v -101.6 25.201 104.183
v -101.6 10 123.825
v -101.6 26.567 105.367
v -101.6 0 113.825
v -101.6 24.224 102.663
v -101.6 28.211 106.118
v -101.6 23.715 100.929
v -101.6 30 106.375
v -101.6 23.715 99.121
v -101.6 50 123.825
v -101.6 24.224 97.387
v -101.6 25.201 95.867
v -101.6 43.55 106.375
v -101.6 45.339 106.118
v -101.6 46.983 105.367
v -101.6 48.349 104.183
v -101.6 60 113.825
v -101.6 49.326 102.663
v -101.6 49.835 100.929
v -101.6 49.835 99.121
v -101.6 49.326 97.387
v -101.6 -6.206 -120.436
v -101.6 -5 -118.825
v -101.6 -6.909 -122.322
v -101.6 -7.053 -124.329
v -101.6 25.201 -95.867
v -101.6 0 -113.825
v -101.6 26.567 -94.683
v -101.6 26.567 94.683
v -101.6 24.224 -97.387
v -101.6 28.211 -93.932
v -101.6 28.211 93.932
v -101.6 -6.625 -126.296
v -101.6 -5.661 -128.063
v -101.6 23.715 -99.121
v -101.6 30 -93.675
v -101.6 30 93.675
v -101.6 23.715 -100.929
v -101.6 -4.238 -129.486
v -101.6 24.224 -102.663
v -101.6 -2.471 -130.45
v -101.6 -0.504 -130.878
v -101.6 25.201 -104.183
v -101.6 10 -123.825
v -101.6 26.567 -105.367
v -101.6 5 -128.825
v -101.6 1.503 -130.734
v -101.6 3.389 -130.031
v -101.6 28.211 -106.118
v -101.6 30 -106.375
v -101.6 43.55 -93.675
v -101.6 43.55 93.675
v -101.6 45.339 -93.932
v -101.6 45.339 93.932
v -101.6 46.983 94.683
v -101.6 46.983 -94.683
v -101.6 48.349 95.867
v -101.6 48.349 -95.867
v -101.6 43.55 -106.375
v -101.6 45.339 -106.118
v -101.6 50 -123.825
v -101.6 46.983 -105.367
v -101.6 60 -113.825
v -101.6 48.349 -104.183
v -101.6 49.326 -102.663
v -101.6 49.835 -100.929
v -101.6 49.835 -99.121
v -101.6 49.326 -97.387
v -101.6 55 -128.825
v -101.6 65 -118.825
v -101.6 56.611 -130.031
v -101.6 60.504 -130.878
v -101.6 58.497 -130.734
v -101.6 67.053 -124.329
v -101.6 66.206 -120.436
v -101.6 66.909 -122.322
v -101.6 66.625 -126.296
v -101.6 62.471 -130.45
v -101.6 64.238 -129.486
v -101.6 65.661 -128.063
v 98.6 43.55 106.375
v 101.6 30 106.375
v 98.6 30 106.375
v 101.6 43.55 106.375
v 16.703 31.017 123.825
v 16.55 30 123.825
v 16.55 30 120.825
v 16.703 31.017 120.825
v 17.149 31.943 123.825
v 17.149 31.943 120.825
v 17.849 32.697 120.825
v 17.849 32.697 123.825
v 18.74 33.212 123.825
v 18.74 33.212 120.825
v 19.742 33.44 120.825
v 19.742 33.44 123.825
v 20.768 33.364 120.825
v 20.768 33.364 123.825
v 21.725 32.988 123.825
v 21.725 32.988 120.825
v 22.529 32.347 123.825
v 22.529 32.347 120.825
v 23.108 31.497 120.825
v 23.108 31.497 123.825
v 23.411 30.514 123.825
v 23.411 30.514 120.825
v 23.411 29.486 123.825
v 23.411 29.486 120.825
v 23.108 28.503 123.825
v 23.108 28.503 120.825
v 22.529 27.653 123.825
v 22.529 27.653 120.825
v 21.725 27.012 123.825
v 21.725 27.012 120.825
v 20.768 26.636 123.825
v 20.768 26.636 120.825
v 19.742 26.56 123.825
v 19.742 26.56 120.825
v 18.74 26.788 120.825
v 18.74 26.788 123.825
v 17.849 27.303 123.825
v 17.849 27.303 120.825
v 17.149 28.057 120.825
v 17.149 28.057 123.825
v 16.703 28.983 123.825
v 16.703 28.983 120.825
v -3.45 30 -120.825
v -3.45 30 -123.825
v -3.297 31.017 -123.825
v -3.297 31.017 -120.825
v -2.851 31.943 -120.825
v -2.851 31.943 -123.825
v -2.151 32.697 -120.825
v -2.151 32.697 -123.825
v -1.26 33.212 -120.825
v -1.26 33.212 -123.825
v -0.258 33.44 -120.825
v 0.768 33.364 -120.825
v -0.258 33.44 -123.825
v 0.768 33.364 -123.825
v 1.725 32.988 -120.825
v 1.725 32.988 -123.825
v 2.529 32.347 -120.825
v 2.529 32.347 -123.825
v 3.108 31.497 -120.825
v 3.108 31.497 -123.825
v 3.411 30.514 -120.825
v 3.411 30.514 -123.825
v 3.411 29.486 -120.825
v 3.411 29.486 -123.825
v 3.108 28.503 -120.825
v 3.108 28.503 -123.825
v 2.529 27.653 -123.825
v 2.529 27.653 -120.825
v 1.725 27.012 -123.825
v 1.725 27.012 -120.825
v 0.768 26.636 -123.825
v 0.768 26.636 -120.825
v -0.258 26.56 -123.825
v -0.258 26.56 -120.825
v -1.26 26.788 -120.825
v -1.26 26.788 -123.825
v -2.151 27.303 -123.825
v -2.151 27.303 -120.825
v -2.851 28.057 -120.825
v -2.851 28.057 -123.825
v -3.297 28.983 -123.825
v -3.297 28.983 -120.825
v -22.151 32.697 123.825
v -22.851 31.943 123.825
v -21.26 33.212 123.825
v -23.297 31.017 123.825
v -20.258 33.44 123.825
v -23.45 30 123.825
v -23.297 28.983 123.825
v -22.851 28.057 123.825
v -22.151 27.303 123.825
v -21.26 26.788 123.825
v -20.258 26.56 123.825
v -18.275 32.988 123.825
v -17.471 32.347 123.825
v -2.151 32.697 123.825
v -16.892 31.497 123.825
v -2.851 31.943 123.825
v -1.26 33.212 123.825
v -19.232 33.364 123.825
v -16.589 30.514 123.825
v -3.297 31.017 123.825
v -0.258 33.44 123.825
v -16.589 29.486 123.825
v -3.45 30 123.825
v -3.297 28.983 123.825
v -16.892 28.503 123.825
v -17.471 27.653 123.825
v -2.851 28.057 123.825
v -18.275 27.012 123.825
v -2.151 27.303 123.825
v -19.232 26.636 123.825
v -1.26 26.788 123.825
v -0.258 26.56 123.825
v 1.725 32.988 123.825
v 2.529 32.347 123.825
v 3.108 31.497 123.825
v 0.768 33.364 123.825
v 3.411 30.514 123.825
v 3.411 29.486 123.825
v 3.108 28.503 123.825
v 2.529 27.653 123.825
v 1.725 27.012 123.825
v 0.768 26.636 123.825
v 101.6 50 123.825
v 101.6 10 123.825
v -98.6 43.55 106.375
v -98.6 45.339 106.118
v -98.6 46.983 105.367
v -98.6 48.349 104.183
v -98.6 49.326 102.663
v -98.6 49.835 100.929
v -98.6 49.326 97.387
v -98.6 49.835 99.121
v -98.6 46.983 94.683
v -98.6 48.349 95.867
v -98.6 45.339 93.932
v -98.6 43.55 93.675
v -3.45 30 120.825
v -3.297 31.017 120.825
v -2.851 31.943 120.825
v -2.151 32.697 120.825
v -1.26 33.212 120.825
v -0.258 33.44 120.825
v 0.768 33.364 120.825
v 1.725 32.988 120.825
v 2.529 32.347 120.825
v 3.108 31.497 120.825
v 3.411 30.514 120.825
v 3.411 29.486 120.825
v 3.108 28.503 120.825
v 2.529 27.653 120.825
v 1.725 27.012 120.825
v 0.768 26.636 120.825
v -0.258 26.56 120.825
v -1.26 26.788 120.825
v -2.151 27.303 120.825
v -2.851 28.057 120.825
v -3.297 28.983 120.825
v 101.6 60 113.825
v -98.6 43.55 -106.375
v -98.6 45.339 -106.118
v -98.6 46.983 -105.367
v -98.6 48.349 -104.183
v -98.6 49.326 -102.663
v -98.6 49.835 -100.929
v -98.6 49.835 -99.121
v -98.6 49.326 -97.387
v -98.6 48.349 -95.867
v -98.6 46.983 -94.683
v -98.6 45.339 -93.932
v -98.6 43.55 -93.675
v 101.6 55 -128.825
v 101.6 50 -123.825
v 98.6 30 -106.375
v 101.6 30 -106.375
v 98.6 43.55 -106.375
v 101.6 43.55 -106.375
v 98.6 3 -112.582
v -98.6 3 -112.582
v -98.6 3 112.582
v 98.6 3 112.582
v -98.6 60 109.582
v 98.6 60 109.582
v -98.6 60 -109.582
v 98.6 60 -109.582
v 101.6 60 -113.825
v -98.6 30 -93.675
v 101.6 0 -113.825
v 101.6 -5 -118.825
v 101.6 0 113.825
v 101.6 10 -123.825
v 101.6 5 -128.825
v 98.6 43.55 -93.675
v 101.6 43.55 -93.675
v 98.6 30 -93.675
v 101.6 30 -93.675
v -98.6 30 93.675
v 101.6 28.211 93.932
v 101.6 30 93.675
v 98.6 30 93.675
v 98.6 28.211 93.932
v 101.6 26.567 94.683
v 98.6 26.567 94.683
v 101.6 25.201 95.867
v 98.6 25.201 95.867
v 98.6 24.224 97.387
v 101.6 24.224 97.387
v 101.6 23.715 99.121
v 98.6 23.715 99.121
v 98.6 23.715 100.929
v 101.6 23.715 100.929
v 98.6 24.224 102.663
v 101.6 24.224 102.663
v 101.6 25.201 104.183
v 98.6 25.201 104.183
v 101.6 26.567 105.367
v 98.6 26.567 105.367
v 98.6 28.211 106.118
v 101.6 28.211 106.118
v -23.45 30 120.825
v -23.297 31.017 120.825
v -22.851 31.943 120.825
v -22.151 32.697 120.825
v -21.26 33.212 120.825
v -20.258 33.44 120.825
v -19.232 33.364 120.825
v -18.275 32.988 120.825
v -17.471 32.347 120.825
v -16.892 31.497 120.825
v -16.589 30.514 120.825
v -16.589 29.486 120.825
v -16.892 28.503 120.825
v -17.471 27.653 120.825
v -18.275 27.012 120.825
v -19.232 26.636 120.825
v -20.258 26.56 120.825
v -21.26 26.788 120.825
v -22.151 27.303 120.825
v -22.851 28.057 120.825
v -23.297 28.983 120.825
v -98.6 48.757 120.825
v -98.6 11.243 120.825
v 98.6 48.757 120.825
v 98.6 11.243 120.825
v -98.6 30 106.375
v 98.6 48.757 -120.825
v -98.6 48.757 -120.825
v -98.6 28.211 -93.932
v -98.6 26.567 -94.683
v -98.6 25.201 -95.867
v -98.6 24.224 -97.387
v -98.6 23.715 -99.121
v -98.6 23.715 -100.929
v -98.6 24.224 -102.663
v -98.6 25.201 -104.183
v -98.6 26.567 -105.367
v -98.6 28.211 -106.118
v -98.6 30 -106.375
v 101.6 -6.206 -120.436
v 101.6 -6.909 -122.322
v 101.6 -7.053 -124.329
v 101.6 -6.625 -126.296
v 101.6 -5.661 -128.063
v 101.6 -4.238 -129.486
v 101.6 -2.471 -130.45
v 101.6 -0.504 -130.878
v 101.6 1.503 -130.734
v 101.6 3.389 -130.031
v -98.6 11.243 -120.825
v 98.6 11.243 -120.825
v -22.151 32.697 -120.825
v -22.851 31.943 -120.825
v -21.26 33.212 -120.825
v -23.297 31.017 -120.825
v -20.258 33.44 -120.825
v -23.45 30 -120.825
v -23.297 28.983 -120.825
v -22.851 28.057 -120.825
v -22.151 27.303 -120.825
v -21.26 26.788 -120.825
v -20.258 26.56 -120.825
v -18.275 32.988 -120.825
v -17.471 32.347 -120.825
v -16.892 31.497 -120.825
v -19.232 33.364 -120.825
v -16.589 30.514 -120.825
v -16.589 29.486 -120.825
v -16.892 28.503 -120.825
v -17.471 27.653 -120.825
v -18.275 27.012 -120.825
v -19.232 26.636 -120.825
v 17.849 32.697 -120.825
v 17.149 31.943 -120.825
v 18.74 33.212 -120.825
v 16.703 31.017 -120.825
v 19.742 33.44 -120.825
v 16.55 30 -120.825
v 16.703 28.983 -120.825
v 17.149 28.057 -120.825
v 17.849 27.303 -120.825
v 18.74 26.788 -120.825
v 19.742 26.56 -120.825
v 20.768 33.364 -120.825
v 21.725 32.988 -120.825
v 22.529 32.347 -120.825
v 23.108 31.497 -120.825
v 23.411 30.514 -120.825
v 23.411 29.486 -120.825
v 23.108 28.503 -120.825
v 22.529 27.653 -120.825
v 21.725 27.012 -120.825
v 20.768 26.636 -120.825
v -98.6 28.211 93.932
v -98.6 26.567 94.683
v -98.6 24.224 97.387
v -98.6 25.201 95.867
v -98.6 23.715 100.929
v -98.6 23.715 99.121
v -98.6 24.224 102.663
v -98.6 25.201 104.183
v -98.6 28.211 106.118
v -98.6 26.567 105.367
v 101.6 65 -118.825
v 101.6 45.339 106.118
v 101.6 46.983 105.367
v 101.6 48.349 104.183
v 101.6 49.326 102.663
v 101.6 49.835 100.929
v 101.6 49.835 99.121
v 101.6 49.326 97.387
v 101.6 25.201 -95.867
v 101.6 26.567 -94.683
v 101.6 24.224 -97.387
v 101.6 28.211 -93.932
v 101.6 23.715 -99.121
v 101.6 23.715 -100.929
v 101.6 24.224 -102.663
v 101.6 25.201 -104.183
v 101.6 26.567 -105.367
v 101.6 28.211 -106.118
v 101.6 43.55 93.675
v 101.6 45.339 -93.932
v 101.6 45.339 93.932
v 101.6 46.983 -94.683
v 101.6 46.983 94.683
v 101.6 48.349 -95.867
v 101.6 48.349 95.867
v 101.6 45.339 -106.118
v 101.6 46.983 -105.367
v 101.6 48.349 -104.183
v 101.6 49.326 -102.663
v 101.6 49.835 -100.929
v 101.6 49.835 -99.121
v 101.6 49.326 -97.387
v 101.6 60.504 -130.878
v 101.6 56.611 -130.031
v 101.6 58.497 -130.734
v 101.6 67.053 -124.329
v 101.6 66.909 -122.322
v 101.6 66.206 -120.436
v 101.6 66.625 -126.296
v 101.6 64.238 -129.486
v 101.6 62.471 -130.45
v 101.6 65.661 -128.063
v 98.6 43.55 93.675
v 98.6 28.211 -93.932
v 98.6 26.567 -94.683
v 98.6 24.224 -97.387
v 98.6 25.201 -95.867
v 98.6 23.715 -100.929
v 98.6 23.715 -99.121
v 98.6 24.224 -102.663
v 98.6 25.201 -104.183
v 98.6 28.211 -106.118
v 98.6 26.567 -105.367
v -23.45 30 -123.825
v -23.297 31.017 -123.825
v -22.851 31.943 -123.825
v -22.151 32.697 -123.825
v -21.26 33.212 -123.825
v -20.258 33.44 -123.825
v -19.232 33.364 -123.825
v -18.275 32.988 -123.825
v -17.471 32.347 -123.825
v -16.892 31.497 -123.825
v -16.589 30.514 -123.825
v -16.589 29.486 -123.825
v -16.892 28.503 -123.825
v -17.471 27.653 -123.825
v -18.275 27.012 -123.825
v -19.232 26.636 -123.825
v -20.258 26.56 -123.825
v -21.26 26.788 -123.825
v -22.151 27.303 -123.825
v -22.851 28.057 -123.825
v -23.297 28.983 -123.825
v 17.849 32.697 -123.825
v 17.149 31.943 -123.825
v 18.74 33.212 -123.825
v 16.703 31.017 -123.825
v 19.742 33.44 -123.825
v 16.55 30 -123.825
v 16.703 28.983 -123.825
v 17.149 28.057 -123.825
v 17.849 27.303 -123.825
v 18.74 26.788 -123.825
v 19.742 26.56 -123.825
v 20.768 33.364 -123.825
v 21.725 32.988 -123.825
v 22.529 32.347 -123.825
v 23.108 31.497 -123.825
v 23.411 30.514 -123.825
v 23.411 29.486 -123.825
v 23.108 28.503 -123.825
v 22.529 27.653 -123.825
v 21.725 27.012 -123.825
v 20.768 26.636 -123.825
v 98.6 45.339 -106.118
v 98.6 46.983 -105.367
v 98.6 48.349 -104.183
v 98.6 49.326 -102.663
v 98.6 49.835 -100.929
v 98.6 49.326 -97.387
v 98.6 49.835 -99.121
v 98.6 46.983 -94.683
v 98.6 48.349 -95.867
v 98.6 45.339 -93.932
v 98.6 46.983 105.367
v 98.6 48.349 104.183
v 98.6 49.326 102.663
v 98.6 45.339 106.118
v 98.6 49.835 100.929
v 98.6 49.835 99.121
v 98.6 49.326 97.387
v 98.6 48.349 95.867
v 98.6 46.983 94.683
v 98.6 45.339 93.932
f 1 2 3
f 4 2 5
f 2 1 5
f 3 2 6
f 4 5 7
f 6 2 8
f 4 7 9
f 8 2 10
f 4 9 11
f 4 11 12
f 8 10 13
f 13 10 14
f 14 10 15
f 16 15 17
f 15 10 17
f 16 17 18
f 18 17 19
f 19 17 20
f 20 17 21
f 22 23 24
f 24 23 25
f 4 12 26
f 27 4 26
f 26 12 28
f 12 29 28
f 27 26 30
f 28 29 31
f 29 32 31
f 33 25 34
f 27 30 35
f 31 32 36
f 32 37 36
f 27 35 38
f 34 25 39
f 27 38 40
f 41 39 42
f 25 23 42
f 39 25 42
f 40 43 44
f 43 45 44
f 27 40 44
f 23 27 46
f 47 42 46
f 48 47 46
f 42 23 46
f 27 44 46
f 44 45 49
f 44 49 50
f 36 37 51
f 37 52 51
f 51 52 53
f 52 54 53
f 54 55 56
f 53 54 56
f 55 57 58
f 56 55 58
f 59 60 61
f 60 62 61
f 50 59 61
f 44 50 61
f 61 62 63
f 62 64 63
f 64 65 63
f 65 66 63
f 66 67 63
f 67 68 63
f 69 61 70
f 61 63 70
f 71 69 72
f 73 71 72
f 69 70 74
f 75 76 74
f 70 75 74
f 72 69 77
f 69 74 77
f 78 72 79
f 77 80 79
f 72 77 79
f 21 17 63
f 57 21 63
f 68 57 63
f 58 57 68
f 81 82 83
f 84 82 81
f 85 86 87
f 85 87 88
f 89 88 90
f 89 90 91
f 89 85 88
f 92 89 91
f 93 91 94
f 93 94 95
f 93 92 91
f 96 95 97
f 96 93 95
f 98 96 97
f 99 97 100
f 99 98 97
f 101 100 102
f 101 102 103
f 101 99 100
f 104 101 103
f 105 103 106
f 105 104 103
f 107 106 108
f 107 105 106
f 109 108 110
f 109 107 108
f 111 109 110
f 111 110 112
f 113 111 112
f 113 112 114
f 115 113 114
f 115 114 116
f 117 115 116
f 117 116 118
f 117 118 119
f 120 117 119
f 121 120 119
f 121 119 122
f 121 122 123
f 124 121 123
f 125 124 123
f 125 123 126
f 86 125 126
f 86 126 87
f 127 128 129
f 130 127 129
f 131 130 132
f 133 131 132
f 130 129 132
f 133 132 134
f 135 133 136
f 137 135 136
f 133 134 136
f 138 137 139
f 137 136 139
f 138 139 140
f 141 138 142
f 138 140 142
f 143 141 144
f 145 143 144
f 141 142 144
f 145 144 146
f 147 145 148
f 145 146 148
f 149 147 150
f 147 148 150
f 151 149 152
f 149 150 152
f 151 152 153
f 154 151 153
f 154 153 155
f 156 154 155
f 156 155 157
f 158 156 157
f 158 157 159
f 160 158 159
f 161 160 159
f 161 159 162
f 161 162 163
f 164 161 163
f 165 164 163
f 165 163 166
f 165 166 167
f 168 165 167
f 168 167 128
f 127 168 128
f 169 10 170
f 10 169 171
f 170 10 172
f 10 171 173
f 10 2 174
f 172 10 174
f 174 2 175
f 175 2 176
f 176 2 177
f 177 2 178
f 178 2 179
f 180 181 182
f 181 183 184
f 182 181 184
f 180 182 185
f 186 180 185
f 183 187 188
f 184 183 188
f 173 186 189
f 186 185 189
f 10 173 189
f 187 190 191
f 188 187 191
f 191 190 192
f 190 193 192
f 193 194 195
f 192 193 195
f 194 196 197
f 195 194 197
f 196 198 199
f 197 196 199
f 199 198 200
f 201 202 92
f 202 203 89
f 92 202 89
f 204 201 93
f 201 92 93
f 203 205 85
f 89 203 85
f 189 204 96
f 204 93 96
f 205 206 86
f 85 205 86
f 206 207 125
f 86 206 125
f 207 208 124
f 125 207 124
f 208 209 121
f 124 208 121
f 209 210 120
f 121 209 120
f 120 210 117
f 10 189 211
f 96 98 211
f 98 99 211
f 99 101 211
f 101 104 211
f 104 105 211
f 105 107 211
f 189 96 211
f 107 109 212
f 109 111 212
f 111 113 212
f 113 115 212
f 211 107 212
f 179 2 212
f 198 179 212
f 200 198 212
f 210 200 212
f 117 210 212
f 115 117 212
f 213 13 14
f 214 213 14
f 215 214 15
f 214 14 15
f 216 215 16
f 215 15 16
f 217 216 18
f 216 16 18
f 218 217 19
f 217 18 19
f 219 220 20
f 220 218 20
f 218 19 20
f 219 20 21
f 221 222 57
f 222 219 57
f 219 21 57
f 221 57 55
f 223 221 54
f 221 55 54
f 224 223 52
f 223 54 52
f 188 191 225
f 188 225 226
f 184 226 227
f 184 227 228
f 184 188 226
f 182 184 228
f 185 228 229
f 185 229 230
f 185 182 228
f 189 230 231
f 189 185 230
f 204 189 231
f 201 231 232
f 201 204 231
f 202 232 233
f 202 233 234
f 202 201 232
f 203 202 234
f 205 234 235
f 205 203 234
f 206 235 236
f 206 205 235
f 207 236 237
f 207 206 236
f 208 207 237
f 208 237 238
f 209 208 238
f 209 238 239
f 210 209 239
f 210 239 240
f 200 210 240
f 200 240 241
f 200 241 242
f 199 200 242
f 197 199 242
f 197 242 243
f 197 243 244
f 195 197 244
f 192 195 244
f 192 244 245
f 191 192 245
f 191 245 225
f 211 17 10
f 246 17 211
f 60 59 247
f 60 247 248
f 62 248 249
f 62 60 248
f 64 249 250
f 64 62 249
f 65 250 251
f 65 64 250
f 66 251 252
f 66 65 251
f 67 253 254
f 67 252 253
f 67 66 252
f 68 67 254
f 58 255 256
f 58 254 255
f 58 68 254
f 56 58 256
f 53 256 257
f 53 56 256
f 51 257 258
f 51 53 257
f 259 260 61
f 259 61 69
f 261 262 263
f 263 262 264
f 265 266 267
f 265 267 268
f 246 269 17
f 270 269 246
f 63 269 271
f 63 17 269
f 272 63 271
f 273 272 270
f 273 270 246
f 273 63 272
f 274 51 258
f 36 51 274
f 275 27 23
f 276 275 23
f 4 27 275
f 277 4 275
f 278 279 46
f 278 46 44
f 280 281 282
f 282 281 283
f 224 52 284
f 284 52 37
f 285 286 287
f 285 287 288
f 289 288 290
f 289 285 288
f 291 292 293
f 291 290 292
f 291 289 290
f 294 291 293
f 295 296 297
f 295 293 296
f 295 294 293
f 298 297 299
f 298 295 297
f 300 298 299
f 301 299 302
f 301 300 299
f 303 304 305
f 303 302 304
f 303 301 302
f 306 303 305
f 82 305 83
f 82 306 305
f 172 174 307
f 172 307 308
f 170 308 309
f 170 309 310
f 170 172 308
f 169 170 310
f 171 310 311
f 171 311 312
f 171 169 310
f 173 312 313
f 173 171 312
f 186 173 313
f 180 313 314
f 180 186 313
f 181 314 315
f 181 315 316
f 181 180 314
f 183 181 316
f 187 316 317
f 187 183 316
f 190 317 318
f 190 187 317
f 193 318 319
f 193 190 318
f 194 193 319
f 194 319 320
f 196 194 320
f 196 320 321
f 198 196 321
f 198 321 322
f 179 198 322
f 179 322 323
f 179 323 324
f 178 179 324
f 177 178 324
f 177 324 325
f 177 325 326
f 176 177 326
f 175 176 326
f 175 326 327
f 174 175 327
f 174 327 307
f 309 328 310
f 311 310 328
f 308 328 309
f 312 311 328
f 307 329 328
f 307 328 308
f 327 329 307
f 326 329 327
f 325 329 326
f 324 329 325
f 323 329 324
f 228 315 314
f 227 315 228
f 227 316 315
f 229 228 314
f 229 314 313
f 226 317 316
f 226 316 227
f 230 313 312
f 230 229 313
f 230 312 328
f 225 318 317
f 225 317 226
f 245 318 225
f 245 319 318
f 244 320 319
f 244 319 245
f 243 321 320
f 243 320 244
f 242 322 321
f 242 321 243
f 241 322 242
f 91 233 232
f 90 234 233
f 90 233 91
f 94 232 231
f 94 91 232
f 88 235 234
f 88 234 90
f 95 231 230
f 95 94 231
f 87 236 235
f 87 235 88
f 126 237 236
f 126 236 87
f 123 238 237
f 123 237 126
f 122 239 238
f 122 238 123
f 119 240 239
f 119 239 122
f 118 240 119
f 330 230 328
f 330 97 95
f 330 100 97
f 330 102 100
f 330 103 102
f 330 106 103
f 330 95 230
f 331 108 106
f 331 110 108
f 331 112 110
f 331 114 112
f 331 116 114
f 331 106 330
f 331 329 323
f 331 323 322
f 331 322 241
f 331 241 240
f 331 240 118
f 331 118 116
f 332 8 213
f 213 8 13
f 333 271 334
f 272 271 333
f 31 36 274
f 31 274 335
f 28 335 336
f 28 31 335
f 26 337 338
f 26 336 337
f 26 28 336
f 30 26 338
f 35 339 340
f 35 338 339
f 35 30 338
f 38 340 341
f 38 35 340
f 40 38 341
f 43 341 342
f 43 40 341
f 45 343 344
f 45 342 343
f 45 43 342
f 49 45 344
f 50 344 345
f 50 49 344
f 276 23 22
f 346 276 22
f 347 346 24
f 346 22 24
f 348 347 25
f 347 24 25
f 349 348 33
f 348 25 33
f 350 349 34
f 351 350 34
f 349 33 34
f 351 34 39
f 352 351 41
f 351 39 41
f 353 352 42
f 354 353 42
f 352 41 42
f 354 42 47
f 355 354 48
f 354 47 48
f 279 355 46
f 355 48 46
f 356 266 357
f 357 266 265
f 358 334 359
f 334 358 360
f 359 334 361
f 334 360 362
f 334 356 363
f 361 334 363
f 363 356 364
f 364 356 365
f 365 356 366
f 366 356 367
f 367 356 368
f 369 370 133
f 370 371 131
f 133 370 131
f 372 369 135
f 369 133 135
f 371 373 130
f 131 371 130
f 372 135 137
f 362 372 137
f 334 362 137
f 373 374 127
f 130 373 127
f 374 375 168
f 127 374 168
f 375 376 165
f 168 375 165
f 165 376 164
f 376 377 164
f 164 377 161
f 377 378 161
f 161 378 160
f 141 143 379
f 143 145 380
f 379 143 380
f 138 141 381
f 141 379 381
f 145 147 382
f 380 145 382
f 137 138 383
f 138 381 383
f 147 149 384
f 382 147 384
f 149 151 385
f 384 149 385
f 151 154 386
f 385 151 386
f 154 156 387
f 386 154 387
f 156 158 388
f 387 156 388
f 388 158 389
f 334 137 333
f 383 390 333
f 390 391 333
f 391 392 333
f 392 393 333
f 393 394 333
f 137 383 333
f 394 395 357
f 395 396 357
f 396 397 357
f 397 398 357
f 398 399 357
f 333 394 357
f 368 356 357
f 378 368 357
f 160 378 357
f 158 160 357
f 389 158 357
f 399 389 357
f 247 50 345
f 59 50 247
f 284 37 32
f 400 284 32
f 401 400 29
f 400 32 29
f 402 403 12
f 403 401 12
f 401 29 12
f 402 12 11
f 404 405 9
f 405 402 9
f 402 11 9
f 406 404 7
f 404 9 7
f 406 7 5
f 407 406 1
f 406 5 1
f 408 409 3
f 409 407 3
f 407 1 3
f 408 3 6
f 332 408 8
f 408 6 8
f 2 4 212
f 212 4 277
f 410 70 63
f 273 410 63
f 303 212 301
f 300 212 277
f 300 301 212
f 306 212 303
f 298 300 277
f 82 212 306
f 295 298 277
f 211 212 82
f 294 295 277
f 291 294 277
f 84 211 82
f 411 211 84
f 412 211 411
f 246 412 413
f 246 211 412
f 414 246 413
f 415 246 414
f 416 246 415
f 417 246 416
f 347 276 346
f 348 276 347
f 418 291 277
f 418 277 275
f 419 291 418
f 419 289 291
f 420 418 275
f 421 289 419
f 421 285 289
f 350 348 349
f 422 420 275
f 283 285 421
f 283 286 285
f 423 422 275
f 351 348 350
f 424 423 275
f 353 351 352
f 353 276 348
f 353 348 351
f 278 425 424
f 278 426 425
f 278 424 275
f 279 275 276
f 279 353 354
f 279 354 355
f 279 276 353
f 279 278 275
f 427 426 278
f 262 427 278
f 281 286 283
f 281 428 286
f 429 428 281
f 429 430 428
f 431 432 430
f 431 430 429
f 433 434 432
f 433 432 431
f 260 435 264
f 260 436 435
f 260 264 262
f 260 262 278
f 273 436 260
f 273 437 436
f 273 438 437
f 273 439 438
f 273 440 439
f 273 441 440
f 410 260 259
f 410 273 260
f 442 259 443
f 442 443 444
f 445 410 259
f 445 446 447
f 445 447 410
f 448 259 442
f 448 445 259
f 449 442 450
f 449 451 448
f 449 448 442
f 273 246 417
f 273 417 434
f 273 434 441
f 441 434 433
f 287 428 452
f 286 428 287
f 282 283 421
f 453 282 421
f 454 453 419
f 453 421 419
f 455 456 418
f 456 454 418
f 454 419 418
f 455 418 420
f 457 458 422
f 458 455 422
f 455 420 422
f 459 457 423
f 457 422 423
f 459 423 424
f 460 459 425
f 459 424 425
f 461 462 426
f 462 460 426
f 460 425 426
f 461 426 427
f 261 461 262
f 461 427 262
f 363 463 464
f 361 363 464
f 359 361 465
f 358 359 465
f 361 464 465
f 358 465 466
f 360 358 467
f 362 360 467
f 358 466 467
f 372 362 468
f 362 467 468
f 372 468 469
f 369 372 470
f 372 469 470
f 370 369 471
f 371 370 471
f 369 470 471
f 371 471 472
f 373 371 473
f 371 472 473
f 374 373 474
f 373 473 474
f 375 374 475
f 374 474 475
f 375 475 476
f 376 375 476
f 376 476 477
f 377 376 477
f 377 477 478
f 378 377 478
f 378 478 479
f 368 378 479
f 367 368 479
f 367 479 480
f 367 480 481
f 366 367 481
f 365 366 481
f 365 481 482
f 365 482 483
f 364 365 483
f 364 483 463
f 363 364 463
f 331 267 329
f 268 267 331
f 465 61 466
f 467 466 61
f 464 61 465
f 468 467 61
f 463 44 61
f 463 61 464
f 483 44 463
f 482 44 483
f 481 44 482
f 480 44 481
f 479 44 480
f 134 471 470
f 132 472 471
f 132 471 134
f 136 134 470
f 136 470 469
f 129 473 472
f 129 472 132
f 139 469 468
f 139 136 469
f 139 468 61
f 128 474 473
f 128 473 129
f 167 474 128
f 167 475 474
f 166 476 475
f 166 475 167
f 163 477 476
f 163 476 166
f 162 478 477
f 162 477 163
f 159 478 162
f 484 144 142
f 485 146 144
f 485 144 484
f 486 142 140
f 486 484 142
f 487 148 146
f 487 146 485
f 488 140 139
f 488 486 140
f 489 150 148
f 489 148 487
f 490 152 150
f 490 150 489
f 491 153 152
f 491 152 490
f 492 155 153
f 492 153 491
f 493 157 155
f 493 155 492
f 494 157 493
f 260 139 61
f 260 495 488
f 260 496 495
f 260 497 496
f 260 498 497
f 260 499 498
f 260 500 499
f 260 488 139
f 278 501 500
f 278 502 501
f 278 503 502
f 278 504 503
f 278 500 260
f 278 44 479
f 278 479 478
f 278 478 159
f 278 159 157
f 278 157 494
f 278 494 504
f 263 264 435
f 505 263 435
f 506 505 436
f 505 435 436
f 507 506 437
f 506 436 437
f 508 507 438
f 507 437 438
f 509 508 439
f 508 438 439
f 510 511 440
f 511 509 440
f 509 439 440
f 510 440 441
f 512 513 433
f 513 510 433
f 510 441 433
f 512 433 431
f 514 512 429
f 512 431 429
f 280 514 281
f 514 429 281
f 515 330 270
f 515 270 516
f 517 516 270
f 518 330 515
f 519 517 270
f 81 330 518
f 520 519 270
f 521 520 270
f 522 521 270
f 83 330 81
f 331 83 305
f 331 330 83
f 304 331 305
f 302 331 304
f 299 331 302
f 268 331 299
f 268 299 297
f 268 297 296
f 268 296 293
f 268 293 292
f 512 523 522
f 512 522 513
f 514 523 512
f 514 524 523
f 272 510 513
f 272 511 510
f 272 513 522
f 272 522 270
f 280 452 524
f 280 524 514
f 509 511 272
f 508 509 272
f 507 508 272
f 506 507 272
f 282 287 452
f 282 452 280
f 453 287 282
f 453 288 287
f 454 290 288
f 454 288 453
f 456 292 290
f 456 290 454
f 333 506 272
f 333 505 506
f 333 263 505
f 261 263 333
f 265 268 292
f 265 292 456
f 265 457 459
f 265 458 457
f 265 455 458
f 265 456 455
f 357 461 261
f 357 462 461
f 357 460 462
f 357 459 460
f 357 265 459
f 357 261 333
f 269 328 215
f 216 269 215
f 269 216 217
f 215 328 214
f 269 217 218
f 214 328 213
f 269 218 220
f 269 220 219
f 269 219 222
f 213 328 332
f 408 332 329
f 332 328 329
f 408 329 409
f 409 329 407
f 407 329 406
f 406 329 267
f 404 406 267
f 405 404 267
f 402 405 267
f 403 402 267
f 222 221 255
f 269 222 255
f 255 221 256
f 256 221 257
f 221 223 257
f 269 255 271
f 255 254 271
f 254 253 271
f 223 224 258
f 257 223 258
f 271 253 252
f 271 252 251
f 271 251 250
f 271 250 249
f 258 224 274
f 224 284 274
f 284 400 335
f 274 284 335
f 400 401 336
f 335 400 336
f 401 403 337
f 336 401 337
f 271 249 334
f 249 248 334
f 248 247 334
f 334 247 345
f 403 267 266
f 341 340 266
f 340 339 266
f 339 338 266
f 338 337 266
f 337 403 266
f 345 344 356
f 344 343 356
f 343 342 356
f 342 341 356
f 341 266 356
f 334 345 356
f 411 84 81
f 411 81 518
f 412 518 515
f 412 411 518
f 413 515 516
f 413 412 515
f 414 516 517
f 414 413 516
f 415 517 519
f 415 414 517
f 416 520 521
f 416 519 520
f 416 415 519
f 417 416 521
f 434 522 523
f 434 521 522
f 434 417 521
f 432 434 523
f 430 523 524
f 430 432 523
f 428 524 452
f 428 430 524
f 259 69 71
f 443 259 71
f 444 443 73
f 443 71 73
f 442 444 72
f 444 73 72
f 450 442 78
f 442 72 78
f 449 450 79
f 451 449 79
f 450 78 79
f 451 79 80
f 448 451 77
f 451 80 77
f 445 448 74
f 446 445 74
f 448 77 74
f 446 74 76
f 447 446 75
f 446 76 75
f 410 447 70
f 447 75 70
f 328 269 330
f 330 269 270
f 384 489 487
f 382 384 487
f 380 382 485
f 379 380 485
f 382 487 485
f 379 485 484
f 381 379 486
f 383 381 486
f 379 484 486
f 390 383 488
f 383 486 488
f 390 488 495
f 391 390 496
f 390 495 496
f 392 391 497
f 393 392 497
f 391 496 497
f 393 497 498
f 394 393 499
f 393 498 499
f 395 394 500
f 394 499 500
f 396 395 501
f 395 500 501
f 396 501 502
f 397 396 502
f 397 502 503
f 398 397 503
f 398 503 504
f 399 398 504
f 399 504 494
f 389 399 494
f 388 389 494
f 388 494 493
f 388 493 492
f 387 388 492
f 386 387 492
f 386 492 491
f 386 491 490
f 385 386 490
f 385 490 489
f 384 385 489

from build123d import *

# Parameters (mm, degrees)
SKETCH1_W                                = 203.2
SKETCH1_H                                = 247.65
BOSS_EXTRUDE1_DEPTH                      = 60
CHAMFER1_SIZE                            = 10
SHELL3_T                                 = -3
CUT_EXTRUDE1_REACH                       = 247.403
MIRROR1_AT_THE_SECOND_PLANE_COPY_1_REACH = 247.403
CUT_EXTRUDE2_REACH                       = 276.323
SKETCH3_R                                = 3.45
BOSS_EXTRUDE2_DEPTH                      = 203.2


with BuildPart() as part:
    # Sketch1 → Boss-Extrude1 (new body)
    with BuildSketch(Plane(origin=(0, 0, 0), x_dir=(1, 0, 0), z_dir=(0, 1, 0))):
        Rectangle(SKETCH1_W, SKETCH1_H)
    extrude(amount=BOSS_EXTRUDE1_DEPTH)

    # Chamfer1
    chamfer1_edges = [part.edges().sort_by_distance(p)[0] for p in [
        (0, 60, 123.825),
        (0, 0, 123.825),
        (0, 0, -123.825),
        (0, 60, -123.825),
    ]]
    chamfer(chamfer1_edges, length=CHAMFER1_SIZE)

    # Shell3
    shell3_openings = [part.faces().sort_by_distance(p)[0] for p in [
        (0, 60, 0),
    ]]
    offset(amount=SHELL3_T, openings=shell3_openings, kind=Kind.INTERSECTION)

    # Sketch2 → Cut-Extrude1 (cut, up to next)
    with BuildSketch(Plane.ZY.offset(101.6), mode=Mode.PRIVATE) as cut_extrude1_sk1:
        with BuildLine():
            Line((-93.675, 43.55), (-93.675, 30))
            ThreePointArc((-93.675, 30), (-100.025, 23.65), (-106.375, 30))
            Line((-106.375, 30), (-106.375, 43.55))
            ThreePointArc((-106.375, 43.55), (-100.025, 49.9), (-93.675, 43.55))
        make_face()
    cut_extrude1_tool1 = extrude(cut_extrude1_sk1.sketch, amount=-CUT_EXTRUDE1_REACH, mode=Mode.PRIVATE) & part.part
    cut_extrude1 = cut_extrude1_tool1.solids().sort_by_distance((-101.6, 36.775, -100.025))[0]
    add(cut_extrude1, mode=Mode.SUBTRACT)

    # Mirror1: Cut-Extrude1 across plane
    add(cut_extrude1.mirror(Plane.XY), mode=Mode.SUBTRACT)

    # Mirror1 at the second plane: Cut-Extrude1 across plane
    add(cut_extrude1.mirror(Plane(origin=(0, 0, 0), x_dir=(0, 0, 1), z_dir=(1, 0, 0))), mode=Mode.SUBTRACT)

    # Mirror1 at the second plane copy 1 sketc → Mirror1 at the second plane copy 1 (cut, up to next)
    with BuildSketch(Plane(origin=(101.6, 0, 0), x_dir=(0, 0, -1), z_dir=(1, 0, 0)), mode=Mode.PRIVATE) as mirror1_at_the_second_plane_copy_1_sk1:
        with BuildLine():
            Line((-93.675, 43.55), (-93.675, 30))
            ThreePointArc((-93.675, 30), (-100.025, 23.65), (-106.375, 30))
            Line((-106.375, 30), (-106.375, 43.55))
            ThreePointArc((-106.375, 43.55), (-100.025, 49.9), (-93.675, 43.55))
        make_face()
    mirror1_at_the_second_plane_copy_1_tool1 = extrude(mirror1_at_the_second_plane_copy_1_sk1.sketch, amount=-MIRROR1_AT_THE_SECOND_PLANE_COPY_1_REACH, mode=Mode.PRIVATE) & part.part
    add(mirror1_at_the_second_plane_copy_1_tool1.solids().sort_by_distance((101.6, 36.775, 100.025))[0], mode=Mode.SUBTRACT)

    # Sketch3 → Cut-Extrude2 (cut, up to next)
    with BuildSketch(Plane(origin=(0, 0, -123.825), x_dir=(-1, 0, 0), z_dir=(0, 0, -1)), mode=Mode.PRIVATE) as cut_extrude2_sk1:
        with Locations((0, 30)):
            Circle(SKETCH3_R)
    cut_extrude2_tool1 = extrude(cut_extrude2_sk1.sketch, amount=-CUT_EXTRUDE2_REACH, mode=Mode.PRIVATE) & part.part
    # Sketch3 → Cut-Extrude2 (cut, up to next)
    with BuildSketch(Plane(origin=(0, 0, -123.825), x_dir=(-1, 0, 0), z_dir=(0, 0, -1)), mode=Mode.PRIVATE) as cut_extrude2_sk2:
        with Locations((20, 30)):
            Circle(SKETCH3_R)
    cut_extrude2_tool2 = extrude(cut_extrude2_sk2.sketch, amount=-CUT_EXTRUDE2_REACH, mode=Mode.PRIVATE) & part.part
    # Sketch3 → Cut-Extrude2 (cut, up to next)
    with BuildSketch(Plane(origin=(0, 0, -123.825), x_dir=(-1, 0, 0), z_dir=(0, 0, -1)), mode=Mode.PRIVATE) as cut_extrude2_sk3:
        with Locations((-20, 30)):
            Circle(SKETCH3_R)
    cut_extrude2_tool3 = extrude(cut_extrude2_sk3.sketch, amount=-CUT_EXTRUDE2_REACH, mode=Mode.PRIVATE) & part.part
    cut_extrude2_1 = cut_extrude2_tool1.solids().sort_by_distance((0, 30, -123.825))[0]
    add(cut_extrude2_1, mode=Mode.SUBTRACT)
    cut_extrude2_2 = cut_extrude2_tool2.solids().sort_by_distance((-20, 30, -123.825))[0]
    add(cut_extrude2_2, mode=Mode.SUBTRACT)
    cut_extrude2_3 = cut_extrude2_tool3.solids().sort_by_distance((20, 30, -123.825))[0]
    add(cut_extrude2_3, mode=Mode.SUBTRACT)
    cut_extrude2 = cut_extrude2_1 + cut_extrude2_2 + cut_extrude2_3  # Cut-Extrude2 as one shape, for the pattern or mirror that repeats it

    # Mirror2: Cut-Extrude2 across plane
    add(cut_extrude2.mirror(Plane.XY), mode=Mode.SUBTRACT)

    # Sketch4 → Boss-Extrude2 (add)
    with BuildSketch(Plane.ZY.offset(101.6)):
        with BuildLine():
            Line((-123.825, 50), (-128.825, 55))
            ThreePointArc((-128.825, 55), (-128.825, 65), (-118.825, 65))
            Line((-118.825, 65), (-113.825, 60))
            Line((-113.825, 60), (-123.825, 50))
        make_face()
        with BuildLine():
            Line((-123.825, 10), (-113.825, 0))
            Line((-113.825, 0), (-118.825, -5))
            ThreePointArc((-118.825, -5), (-128.825, -5), (-128.825, 5))
            Line((-128.825, 5), (-123.825, 10))
        make_face()
    extrude(amount=-BOSS_EXTRUDE2_DEPTH)


solid = part.part
